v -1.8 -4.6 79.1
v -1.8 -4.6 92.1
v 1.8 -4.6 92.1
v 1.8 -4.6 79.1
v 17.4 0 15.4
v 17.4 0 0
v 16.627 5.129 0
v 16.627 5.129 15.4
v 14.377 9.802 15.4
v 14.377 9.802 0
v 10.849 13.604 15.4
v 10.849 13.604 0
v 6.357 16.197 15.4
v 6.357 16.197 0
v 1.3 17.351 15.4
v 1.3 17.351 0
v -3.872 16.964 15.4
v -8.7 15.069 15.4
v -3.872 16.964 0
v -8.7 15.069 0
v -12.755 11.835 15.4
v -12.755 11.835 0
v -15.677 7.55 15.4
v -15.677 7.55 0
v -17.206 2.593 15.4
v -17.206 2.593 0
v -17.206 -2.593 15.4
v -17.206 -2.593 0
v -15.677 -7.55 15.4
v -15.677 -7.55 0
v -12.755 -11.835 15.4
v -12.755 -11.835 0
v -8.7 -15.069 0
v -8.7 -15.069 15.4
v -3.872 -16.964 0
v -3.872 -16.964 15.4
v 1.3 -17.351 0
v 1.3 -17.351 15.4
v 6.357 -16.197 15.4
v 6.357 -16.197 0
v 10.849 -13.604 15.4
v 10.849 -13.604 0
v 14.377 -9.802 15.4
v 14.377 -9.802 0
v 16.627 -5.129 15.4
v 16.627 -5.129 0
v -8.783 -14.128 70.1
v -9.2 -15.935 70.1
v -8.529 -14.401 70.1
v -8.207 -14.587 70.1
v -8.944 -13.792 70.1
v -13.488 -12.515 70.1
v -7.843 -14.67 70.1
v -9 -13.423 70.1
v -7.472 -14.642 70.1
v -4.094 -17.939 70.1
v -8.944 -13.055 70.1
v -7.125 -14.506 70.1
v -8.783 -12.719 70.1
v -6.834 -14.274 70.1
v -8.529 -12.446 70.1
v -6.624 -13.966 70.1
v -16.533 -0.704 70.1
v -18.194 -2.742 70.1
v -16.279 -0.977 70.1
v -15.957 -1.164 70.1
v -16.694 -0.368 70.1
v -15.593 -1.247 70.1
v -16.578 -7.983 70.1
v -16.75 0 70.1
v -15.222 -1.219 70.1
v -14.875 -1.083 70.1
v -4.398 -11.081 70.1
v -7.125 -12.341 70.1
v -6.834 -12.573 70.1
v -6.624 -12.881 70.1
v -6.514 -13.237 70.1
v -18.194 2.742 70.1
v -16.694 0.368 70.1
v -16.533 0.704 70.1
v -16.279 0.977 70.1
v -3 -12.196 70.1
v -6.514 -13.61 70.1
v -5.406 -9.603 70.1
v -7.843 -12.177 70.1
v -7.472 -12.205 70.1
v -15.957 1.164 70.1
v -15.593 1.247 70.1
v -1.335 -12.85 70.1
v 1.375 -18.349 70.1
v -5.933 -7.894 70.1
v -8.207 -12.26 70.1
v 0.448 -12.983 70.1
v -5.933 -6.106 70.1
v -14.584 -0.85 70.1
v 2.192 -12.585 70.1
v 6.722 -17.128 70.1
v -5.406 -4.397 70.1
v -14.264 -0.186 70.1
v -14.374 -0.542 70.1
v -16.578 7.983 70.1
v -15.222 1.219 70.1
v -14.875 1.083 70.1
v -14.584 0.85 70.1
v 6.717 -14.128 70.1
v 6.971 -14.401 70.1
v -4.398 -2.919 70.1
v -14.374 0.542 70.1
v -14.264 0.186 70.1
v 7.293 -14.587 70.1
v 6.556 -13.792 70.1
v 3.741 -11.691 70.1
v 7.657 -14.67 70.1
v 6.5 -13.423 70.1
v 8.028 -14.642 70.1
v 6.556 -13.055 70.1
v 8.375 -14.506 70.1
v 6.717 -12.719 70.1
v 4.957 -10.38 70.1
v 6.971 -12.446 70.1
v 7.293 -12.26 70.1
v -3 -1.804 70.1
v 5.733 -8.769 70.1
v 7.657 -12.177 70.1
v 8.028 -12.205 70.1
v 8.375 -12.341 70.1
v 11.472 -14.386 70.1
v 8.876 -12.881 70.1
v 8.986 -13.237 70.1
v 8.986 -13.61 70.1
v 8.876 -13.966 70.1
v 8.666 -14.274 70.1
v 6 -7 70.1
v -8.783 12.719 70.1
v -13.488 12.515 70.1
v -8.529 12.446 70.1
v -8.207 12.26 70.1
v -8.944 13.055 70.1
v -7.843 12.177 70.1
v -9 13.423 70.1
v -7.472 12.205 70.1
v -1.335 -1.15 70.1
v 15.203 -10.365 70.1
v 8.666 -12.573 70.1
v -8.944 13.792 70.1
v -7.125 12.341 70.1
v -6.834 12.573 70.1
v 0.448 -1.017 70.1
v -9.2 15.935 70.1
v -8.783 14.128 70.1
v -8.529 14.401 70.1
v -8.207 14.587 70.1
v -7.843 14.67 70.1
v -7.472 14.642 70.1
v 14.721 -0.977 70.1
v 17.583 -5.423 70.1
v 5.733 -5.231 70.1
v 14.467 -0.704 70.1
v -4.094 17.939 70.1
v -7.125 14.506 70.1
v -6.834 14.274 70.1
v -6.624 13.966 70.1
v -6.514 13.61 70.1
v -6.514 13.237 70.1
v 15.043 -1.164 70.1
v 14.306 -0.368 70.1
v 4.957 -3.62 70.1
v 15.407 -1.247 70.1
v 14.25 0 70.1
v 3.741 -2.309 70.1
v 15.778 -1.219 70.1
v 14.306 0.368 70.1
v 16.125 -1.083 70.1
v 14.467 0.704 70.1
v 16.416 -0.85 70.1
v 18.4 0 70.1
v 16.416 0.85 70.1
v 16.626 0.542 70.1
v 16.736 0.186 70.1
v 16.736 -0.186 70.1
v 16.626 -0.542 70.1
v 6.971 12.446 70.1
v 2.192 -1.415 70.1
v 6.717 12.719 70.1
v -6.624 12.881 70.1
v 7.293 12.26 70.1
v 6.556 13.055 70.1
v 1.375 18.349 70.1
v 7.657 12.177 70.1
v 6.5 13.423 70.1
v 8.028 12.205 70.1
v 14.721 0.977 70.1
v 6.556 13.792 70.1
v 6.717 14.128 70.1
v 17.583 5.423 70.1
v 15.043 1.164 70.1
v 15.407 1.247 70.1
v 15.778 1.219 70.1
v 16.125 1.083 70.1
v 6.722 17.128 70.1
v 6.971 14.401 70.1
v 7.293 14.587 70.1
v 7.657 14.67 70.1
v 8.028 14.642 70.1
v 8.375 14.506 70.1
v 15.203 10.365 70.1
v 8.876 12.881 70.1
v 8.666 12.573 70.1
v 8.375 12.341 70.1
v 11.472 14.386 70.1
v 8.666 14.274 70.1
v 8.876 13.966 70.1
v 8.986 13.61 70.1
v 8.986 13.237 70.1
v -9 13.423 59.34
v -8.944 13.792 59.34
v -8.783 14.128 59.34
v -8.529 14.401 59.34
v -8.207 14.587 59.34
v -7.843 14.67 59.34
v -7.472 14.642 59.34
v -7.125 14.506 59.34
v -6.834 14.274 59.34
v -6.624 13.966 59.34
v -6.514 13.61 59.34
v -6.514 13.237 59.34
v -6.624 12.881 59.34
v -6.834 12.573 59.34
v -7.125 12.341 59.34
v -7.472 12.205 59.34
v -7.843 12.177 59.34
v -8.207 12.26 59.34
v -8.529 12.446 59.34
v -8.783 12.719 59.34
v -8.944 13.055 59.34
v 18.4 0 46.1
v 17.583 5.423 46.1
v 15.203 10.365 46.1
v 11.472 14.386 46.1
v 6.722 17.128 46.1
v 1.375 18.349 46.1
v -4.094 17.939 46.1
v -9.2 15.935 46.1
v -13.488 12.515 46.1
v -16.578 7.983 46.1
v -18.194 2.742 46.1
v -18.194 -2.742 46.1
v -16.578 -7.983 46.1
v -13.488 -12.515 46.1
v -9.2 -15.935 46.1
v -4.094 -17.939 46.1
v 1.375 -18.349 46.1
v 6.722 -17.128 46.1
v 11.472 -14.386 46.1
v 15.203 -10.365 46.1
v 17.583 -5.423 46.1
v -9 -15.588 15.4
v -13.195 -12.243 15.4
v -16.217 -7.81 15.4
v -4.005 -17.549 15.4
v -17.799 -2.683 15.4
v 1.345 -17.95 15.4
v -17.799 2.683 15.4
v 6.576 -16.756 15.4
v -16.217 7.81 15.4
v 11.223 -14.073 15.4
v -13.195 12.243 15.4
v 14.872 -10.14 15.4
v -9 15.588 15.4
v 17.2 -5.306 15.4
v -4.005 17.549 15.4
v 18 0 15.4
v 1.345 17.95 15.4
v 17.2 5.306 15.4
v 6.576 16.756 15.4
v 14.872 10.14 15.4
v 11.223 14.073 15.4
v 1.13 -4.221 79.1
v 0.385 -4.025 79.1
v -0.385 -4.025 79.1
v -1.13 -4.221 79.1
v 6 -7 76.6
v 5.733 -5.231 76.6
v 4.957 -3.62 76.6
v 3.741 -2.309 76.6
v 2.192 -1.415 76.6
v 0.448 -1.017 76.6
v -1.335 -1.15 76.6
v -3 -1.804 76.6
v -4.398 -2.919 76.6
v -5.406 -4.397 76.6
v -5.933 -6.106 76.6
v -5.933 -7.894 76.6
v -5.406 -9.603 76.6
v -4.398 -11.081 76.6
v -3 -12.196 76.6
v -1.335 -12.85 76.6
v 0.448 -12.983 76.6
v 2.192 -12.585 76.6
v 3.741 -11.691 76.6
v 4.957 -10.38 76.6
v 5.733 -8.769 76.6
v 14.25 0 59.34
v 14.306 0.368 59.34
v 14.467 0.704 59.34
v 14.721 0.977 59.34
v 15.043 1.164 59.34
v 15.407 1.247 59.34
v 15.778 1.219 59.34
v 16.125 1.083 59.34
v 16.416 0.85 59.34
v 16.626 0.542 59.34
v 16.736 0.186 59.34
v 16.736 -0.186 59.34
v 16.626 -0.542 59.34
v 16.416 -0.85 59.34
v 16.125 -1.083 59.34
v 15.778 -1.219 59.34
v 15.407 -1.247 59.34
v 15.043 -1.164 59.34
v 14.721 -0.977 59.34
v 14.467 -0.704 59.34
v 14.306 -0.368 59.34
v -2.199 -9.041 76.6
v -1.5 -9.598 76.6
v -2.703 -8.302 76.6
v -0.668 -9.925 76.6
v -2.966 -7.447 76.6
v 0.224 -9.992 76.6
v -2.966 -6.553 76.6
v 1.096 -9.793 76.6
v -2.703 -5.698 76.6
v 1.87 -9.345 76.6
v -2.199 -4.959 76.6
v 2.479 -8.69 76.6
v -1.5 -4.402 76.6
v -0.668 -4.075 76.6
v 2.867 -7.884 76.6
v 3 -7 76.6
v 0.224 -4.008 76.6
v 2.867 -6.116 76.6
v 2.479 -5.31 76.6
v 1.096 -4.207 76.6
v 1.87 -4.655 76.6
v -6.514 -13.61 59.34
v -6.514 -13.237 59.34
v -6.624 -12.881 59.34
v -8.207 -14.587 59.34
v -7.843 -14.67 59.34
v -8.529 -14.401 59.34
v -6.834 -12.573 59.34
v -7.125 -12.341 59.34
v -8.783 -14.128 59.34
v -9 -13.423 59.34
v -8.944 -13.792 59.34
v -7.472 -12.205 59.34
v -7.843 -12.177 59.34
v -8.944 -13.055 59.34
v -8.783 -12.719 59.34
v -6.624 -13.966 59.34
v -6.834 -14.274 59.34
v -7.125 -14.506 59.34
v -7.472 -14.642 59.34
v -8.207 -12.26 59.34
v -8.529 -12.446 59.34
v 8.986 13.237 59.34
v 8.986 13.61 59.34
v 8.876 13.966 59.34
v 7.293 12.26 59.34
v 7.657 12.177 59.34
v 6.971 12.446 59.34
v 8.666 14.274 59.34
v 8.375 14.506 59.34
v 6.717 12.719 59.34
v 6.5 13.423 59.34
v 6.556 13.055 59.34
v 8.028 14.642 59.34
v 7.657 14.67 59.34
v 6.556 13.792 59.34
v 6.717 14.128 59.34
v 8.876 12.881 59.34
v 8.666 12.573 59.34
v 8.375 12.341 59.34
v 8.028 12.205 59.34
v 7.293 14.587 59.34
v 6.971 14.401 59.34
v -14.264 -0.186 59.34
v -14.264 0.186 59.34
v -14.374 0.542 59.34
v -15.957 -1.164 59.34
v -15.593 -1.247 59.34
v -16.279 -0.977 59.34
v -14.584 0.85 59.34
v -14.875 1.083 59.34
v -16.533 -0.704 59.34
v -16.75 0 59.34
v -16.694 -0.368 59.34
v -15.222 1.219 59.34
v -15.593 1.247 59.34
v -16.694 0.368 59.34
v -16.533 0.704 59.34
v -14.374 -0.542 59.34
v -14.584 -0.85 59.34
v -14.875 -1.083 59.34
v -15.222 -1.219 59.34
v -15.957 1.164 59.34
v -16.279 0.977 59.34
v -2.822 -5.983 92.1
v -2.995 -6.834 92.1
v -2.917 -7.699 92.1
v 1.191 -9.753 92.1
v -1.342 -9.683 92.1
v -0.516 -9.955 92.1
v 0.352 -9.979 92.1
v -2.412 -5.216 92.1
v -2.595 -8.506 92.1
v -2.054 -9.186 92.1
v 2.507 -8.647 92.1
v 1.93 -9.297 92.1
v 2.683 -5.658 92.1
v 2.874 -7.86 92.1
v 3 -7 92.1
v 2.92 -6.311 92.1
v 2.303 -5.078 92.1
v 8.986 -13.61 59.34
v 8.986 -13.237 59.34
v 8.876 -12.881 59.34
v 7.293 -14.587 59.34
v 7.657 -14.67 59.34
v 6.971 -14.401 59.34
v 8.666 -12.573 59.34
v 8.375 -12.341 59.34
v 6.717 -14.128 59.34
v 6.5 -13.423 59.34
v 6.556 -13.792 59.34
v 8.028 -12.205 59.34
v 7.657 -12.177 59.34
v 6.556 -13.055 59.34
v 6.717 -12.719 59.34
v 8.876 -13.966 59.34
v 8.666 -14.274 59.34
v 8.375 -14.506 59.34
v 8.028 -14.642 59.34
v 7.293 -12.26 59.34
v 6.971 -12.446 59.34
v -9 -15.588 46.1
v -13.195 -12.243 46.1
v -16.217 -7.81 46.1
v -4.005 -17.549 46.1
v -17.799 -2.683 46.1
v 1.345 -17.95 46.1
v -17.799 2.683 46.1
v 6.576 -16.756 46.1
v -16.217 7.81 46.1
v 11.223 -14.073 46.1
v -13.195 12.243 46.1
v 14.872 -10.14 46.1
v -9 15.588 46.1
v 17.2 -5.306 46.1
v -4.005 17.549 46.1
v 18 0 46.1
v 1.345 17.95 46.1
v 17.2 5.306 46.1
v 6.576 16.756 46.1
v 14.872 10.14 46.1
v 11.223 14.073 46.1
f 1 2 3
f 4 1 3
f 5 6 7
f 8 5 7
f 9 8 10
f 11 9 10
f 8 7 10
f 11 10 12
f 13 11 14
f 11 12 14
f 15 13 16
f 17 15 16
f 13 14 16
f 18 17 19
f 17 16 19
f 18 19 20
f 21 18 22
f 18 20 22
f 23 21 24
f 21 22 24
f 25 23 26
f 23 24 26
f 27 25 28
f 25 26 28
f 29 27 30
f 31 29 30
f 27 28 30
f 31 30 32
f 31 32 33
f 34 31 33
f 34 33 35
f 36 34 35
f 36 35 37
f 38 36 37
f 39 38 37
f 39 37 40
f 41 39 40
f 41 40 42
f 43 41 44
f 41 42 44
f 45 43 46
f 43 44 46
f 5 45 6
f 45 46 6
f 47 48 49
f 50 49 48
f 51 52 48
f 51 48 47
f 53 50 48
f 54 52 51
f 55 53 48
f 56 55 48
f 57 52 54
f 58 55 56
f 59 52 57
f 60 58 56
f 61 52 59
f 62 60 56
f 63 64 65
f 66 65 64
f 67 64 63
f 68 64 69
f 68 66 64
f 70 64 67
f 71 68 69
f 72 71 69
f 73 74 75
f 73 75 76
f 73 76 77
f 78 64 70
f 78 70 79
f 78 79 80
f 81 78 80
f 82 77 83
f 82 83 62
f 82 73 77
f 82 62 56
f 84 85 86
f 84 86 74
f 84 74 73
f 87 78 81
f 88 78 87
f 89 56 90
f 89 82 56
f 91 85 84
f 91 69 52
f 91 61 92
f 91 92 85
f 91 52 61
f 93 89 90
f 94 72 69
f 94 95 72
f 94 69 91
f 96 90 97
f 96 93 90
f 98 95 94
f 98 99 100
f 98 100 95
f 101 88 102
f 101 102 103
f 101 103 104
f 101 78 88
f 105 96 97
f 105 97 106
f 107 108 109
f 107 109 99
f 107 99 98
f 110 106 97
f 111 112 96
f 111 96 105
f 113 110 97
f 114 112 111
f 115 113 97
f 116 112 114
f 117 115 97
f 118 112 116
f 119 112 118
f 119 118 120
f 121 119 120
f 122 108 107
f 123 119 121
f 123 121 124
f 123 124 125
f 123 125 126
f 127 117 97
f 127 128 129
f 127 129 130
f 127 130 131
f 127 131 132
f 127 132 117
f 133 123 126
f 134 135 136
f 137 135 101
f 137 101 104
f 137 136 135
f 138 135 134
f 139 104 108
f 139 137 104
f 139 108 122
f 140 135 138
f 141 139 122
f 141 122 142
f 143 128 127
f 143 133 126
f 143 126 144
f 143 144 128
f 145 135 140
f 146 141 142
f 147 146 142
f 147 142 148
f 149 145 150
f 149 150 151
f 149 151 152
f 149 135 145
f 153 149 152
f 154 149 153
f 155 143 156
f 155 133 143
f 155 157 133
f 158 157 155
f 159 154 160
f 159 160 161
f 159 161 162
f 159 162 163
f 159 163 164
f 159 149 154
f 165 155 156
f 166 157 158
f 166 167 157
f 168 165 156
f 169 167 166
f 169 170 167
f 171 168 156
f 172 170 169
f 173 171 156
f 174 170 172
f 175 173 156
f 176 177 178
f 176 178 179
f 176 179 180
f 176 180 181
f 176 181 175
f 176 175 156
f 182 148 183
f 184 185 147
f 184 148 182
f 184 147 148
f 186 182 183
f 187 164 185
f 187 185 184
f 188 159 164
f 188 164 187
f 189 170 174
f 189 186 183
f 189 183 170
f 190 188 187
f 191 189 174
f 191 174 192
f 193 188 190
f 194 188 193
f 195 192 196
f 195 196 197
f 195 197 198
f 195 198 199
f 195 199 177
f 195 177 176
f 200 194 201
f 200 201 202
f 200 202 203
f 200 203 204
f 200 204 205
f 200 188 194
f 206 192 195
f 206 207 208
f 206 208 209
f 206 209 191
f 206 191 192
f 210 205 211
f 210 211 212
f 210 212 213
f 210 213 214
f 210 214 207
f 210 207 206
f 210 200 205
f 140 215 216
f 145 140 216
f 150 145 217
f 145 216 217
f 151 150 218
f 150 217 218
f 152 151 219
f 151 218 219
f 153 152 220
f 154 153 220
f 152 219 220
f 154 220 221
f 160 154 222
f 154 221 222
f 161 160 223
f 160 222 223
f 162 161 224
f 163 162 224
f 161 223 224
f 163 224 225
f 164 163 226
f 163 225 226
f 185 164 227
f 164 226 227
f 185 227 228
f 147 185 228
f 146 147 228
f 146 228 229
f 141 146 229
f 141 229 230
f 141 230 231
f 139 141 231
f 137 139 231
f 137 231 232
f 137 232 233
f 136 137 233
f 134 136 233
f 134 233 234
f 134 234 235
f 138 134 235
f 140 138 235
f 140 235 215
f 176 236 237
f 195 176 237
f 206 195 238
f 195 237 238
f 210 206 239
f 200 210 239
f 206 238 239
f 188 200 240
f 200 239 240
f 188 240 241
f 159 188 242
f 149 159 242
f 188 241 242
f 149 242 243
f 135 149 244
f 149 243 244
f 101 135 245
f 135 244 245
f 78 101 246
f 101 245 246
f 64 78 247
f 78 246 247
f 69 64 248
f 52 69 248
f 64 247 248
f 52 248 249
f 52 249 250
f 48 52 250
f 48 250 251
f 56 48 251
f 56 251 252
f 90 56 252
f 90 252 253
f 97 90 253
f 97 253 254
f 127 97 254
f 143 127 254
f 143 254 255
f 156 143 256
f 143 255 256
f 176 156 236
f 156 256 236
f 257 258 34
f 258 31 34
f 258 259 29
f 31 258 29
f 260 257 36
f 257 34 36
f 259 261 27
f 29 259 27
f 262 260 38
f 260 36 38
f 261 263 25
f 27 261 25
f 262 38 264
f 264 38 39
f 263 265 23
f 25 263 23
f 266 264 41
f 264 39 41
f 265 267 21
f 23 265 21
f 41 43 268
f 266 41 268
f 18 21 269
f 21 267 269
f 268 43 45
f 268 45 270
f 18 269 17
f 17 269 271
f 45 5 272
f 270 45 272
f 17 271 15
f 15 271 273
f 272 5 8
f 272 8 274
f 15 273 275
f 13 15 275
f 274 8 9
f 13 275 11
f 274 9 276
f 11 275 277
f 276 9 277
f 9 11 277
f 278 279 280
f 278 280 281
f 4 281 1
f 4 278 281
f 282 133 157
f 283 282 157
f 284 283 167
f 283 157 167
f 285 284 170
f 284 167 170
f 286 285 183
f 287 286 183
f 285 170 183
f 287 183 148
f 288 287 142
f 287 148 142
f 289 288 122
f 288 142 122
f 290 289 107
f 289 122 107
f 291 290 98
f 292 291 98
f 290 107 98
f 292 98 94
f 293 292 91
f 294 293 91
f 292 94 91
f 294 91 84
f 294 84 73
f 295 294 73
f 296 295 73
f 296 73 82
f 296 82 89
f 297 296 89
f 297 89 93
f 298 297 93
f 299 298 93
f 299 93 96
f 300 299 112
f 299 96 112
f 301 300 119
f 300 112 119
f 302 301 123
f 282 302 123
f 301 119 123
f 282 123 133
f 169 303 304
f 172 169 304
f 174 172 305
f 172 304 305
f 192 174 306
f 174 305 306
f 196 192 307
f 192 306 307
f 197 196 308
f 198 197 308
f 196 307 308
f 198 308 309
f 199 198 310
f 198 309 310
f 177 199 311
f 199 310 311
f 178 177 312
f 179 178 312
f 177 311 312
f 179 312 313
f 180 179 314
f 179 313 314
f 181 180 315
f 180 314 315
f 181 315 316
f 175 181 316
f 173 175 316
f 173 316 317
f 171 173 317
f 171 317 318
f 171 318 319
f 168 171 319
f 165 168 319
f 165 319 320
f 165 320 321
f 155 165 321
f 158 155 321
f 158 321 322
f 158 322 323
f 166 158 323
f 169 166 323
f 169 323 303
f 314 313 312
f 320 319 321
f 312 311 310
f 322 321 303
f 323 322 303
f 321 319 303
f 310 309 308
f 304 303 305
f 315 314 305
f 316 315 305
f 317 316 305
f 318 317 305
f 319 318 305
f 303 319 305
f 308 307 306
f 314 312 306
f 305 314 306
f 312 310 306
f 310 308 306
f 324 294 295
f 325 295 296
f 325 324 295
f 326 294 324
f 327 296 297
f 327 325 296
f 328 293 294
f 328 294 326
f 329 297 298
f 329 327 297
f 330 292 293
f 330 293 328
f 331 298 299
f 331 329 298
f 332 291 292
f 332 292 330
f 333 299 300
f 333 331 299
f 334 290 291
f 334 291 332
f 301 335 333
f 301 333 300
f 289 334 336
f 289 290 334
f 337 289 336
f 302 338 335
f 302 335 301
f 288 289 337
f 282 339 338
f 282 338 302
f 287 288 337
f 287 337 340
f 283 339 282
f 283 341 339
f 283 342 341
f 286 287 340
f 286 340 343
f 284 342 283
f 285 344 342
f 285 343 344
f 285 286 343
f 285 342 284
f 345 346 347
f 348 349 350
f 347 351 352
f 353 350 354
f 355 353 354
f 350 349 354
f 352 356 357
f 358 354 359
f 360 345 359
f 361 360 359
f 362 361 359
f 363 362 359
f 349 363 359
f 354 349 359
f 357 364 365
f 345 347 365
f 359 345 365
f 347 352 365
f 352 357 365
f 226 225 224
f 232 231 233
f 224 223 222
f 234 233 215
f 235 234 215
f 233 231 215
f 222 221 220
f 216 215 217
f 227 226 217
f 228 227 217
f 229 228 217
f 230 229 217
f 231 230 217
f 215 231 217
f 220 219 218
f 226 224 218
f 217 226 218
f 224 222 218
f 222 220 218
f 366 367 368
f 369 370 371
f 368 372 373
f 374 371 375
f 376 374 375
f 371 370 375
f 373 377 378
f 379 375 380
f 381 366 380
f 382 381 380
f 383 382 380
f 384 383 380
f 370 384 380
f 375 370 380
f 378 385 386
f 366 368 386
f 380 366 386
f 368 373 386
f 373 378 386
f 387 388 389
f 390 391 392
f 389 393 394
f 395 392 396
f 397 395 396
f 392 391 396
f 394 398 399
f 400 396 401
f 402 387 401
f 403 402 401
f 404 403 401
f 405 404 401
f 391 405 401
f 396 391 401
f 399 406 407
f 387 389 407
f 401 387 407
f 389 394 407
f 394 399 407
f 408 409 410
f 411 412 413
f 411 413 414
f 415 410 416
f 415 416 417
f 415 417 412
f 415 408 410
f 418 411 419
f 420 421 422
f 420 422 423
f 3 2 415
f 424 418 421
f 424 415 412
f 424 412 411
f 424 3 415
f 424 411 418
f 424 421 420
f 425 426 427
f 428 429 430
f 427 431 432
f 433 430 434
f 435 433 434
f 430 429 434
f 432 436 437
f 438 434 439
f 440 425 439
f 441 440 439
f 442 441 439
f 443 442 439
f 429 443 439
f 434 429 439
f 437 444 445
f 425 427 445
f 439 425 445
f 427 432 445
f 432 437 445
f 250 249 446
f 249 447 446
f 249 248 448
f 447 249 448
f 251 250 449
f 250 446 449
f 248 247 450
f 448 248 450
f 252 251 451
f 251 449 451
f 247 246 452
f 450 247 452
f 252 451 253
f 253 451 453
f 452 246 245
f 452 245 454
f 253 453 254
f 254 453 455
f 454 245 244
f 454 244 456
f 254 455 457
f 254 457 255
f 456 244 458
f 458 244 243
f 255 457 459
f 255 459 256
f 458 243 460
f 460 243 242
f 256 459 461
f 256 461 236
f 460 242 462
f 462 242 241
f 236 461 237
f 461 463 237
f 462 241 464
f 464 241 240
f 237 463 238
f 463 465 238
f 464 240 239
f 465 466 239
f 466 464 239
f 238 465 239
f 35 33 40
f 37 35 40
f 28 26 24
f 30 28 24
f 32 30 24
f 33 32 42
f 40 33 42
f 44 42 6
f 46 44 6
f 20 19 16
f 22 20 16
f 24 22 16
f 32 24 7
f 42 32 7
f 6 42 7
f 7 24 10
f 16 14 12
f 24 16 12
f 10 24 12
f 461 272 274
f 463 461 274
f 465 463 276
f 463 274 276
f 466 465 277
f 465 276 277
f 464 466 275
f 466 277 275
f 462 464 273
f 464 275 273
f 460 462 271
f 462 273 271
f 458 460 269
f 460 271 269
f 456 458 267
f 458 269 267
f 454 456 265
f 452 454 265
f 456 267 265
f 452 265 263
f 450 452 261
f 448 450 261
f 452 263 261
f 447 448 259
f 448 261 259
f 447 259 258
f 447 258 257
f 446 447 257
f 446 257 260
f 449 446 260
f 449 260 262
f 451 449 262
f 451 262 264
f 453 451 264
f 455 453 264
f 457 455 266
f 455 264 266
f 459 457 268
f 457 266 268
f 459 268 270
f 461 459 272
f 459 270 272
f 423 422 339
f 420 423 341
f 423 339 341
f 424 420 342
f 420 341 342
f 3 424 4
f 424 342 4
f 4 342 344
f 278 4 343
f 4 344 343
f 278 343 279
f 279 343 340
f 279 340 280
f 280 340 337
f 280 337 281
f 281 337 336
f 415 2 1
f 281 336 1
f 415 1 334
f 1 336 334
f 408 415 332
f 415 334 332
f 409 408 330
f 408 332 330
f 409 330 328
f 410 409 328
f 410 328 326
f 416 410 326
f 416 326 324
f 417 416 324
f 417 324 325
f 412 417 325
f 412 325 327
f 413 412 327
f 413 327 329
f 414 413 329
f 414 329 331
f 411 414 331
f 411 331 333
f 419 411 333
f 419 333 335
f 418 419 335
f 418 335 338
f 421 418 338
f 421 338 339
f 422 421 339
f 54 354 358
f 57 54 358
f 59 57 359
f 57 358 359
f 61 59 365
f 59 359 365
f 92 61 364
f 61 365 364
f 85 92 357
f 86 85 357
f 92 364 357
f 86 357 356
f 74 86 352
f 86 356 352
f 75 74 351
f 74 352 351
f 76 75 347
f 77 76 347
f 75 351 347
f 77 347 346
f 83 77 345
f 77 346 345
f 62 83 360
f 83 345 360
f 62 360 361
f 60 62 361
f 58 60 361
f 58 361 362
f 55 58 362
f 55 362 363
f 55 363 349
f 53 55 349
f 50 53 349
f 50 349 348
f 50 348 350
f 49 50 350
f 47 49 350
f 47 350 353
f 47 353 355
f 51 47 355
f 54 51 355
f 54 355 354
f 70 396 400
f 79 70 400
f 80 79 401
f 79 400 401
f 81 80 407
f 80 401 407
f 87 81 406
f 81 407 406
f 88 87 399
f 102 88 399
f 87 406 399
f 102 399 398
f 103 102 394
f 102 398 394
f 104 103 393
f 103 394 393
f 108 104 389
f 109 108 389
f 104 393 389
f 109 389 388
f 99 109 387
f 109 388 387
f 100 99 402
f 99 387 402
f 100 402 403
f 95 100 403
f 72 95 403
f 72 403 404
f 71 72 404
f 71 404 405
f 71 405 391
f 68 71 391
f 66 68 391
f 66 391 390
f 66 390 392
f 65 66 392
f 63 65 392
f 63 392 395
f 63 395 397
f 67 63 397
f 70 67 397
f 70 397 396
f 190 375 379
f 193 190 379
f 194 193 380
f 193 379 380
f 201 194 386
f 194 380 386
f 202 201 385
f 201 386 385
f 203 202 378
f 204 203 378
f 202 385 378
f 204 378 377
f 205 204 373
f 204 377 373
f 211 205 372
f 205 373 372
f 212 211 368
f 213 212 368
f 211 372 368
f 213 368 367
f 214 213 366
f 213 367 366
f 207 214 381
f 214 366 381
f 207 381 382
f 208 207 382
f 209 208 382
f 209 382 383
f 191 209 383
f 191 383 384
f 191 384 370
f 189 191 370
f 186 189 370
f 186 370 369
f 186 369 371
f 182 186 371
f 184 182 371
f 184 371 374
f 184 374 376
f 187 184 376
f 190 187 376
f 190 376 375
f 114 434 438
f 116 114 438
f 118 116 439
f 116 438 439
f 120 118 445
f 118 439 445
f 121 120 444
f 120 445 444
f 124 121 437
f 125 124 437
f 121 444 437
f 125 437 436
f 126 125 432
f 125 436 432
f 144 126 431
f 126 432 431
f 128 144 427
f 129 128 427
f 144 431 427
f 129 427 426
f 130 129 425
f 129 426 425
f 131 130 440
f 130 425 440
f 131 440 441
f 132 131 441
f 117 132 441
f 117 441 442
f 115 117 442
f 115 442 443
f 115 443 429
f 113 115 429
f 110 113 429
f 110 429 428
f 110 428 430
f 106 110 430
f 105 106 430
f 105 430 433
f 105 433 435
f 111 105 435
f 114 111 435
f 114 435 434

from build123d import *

# Parameters (mm, degrees)
SKETCH1_R                       = 17.4
BOSS_EXTRUDE1_DEPTH             = 15.4
SKETCH2_R                       = 18
BOSS_EXTRUDE2_DEPTH             = 30.7
SKETCH3_R                       = 18.4
BOSS_EXTRUDE3_DEPTH             = 24
SKETCH4_R                       = 6
BOSS_EXTRUDE4_DEPTH             = 6.5
SKETCH5_R                       = 3
BOSS_EXTRUDE5_DEPTH             = 15.5
CUT_EXTRUDE1_DEPTH              = 13
TAP_DRILL_FOR_M3X0_5_TAP1_D     = 2.5
TAP_DRILL_FOR_M3X0_5_TAP1_DEPTH = 10.76


with BuildPart() as part:
    # Sketch1 → Boss-Extrude1 (new body)
    with BuildSketch(Plane.XY):
        Circle(SKETCH1_R)
    extrude(amount=BOSS_EXTRUDE1_DEPTH)

    # Sketch2 → Boss-Extrude2 (add)
    with BuildSketch(Plane.XY.offset(15.4)):
        Circle(SKETCH2_R)
    extrude(amount=BOSS_EXTRUDE2_DEPTH)

    # Sketch3 → Boss-Extrude3 (add)
    with BuildSketch(Plane.XY.offset(46.1)):
        Circle(SKETCH3_R)
    extrude(amount=BOSS_EXTRUDE3_DEPTH)

    # Sketch4 → Boss-Extrude4 (add)
    with BuildSketch(Plane.XY.offset(70.1)):
        with Locations((0, -7)):
            Circle(SKETCH4_R)
    extrude(amount=BOSS_EXTRUDE4_DEPTH)

    # Sketch5 → Boss-Extrude5 (add)
    with BuildSketch(Plane.XY.offset(76.6)):
        with Locations((0, -7)):
            Circle(SKETCH5_R)
    extrude(amount=BOSS_EXTRUDE5_DEPTH)

    # Sketch6 → Cut-Extrude1 (cut)
    with BuildSketch(Plane.XY.offset(92.1)):
        with BuildLine():
            Line((-1.8, -4.6), (1.8, -4.6))
            ThreePointArc((1.8, -4.6), (0, -4), (-1.8, -4.6))
        make_face()
    extrude(amount=-CUT_EXTRUDE1_DEPTH, mode=Mode.SUBTRACT)

    # Tap Drill for M3x0.5 Tap1
    with Locations(Plane.XY.offset(70.1)):
        with Locations((-15.5, 0), (-7.75, 13.423393759), (7.75, 13.423393759), (15.5, 0), (7.75, -13.423393759), (-7.75, -13.423393759)):
            Hole(TAP_DRILL_FOR_M3X0_5_TAP1_D / 2, depth=TAP_DRILL_FOR_M3X0_5_TAP1_DEPTH)


solid = part.part
